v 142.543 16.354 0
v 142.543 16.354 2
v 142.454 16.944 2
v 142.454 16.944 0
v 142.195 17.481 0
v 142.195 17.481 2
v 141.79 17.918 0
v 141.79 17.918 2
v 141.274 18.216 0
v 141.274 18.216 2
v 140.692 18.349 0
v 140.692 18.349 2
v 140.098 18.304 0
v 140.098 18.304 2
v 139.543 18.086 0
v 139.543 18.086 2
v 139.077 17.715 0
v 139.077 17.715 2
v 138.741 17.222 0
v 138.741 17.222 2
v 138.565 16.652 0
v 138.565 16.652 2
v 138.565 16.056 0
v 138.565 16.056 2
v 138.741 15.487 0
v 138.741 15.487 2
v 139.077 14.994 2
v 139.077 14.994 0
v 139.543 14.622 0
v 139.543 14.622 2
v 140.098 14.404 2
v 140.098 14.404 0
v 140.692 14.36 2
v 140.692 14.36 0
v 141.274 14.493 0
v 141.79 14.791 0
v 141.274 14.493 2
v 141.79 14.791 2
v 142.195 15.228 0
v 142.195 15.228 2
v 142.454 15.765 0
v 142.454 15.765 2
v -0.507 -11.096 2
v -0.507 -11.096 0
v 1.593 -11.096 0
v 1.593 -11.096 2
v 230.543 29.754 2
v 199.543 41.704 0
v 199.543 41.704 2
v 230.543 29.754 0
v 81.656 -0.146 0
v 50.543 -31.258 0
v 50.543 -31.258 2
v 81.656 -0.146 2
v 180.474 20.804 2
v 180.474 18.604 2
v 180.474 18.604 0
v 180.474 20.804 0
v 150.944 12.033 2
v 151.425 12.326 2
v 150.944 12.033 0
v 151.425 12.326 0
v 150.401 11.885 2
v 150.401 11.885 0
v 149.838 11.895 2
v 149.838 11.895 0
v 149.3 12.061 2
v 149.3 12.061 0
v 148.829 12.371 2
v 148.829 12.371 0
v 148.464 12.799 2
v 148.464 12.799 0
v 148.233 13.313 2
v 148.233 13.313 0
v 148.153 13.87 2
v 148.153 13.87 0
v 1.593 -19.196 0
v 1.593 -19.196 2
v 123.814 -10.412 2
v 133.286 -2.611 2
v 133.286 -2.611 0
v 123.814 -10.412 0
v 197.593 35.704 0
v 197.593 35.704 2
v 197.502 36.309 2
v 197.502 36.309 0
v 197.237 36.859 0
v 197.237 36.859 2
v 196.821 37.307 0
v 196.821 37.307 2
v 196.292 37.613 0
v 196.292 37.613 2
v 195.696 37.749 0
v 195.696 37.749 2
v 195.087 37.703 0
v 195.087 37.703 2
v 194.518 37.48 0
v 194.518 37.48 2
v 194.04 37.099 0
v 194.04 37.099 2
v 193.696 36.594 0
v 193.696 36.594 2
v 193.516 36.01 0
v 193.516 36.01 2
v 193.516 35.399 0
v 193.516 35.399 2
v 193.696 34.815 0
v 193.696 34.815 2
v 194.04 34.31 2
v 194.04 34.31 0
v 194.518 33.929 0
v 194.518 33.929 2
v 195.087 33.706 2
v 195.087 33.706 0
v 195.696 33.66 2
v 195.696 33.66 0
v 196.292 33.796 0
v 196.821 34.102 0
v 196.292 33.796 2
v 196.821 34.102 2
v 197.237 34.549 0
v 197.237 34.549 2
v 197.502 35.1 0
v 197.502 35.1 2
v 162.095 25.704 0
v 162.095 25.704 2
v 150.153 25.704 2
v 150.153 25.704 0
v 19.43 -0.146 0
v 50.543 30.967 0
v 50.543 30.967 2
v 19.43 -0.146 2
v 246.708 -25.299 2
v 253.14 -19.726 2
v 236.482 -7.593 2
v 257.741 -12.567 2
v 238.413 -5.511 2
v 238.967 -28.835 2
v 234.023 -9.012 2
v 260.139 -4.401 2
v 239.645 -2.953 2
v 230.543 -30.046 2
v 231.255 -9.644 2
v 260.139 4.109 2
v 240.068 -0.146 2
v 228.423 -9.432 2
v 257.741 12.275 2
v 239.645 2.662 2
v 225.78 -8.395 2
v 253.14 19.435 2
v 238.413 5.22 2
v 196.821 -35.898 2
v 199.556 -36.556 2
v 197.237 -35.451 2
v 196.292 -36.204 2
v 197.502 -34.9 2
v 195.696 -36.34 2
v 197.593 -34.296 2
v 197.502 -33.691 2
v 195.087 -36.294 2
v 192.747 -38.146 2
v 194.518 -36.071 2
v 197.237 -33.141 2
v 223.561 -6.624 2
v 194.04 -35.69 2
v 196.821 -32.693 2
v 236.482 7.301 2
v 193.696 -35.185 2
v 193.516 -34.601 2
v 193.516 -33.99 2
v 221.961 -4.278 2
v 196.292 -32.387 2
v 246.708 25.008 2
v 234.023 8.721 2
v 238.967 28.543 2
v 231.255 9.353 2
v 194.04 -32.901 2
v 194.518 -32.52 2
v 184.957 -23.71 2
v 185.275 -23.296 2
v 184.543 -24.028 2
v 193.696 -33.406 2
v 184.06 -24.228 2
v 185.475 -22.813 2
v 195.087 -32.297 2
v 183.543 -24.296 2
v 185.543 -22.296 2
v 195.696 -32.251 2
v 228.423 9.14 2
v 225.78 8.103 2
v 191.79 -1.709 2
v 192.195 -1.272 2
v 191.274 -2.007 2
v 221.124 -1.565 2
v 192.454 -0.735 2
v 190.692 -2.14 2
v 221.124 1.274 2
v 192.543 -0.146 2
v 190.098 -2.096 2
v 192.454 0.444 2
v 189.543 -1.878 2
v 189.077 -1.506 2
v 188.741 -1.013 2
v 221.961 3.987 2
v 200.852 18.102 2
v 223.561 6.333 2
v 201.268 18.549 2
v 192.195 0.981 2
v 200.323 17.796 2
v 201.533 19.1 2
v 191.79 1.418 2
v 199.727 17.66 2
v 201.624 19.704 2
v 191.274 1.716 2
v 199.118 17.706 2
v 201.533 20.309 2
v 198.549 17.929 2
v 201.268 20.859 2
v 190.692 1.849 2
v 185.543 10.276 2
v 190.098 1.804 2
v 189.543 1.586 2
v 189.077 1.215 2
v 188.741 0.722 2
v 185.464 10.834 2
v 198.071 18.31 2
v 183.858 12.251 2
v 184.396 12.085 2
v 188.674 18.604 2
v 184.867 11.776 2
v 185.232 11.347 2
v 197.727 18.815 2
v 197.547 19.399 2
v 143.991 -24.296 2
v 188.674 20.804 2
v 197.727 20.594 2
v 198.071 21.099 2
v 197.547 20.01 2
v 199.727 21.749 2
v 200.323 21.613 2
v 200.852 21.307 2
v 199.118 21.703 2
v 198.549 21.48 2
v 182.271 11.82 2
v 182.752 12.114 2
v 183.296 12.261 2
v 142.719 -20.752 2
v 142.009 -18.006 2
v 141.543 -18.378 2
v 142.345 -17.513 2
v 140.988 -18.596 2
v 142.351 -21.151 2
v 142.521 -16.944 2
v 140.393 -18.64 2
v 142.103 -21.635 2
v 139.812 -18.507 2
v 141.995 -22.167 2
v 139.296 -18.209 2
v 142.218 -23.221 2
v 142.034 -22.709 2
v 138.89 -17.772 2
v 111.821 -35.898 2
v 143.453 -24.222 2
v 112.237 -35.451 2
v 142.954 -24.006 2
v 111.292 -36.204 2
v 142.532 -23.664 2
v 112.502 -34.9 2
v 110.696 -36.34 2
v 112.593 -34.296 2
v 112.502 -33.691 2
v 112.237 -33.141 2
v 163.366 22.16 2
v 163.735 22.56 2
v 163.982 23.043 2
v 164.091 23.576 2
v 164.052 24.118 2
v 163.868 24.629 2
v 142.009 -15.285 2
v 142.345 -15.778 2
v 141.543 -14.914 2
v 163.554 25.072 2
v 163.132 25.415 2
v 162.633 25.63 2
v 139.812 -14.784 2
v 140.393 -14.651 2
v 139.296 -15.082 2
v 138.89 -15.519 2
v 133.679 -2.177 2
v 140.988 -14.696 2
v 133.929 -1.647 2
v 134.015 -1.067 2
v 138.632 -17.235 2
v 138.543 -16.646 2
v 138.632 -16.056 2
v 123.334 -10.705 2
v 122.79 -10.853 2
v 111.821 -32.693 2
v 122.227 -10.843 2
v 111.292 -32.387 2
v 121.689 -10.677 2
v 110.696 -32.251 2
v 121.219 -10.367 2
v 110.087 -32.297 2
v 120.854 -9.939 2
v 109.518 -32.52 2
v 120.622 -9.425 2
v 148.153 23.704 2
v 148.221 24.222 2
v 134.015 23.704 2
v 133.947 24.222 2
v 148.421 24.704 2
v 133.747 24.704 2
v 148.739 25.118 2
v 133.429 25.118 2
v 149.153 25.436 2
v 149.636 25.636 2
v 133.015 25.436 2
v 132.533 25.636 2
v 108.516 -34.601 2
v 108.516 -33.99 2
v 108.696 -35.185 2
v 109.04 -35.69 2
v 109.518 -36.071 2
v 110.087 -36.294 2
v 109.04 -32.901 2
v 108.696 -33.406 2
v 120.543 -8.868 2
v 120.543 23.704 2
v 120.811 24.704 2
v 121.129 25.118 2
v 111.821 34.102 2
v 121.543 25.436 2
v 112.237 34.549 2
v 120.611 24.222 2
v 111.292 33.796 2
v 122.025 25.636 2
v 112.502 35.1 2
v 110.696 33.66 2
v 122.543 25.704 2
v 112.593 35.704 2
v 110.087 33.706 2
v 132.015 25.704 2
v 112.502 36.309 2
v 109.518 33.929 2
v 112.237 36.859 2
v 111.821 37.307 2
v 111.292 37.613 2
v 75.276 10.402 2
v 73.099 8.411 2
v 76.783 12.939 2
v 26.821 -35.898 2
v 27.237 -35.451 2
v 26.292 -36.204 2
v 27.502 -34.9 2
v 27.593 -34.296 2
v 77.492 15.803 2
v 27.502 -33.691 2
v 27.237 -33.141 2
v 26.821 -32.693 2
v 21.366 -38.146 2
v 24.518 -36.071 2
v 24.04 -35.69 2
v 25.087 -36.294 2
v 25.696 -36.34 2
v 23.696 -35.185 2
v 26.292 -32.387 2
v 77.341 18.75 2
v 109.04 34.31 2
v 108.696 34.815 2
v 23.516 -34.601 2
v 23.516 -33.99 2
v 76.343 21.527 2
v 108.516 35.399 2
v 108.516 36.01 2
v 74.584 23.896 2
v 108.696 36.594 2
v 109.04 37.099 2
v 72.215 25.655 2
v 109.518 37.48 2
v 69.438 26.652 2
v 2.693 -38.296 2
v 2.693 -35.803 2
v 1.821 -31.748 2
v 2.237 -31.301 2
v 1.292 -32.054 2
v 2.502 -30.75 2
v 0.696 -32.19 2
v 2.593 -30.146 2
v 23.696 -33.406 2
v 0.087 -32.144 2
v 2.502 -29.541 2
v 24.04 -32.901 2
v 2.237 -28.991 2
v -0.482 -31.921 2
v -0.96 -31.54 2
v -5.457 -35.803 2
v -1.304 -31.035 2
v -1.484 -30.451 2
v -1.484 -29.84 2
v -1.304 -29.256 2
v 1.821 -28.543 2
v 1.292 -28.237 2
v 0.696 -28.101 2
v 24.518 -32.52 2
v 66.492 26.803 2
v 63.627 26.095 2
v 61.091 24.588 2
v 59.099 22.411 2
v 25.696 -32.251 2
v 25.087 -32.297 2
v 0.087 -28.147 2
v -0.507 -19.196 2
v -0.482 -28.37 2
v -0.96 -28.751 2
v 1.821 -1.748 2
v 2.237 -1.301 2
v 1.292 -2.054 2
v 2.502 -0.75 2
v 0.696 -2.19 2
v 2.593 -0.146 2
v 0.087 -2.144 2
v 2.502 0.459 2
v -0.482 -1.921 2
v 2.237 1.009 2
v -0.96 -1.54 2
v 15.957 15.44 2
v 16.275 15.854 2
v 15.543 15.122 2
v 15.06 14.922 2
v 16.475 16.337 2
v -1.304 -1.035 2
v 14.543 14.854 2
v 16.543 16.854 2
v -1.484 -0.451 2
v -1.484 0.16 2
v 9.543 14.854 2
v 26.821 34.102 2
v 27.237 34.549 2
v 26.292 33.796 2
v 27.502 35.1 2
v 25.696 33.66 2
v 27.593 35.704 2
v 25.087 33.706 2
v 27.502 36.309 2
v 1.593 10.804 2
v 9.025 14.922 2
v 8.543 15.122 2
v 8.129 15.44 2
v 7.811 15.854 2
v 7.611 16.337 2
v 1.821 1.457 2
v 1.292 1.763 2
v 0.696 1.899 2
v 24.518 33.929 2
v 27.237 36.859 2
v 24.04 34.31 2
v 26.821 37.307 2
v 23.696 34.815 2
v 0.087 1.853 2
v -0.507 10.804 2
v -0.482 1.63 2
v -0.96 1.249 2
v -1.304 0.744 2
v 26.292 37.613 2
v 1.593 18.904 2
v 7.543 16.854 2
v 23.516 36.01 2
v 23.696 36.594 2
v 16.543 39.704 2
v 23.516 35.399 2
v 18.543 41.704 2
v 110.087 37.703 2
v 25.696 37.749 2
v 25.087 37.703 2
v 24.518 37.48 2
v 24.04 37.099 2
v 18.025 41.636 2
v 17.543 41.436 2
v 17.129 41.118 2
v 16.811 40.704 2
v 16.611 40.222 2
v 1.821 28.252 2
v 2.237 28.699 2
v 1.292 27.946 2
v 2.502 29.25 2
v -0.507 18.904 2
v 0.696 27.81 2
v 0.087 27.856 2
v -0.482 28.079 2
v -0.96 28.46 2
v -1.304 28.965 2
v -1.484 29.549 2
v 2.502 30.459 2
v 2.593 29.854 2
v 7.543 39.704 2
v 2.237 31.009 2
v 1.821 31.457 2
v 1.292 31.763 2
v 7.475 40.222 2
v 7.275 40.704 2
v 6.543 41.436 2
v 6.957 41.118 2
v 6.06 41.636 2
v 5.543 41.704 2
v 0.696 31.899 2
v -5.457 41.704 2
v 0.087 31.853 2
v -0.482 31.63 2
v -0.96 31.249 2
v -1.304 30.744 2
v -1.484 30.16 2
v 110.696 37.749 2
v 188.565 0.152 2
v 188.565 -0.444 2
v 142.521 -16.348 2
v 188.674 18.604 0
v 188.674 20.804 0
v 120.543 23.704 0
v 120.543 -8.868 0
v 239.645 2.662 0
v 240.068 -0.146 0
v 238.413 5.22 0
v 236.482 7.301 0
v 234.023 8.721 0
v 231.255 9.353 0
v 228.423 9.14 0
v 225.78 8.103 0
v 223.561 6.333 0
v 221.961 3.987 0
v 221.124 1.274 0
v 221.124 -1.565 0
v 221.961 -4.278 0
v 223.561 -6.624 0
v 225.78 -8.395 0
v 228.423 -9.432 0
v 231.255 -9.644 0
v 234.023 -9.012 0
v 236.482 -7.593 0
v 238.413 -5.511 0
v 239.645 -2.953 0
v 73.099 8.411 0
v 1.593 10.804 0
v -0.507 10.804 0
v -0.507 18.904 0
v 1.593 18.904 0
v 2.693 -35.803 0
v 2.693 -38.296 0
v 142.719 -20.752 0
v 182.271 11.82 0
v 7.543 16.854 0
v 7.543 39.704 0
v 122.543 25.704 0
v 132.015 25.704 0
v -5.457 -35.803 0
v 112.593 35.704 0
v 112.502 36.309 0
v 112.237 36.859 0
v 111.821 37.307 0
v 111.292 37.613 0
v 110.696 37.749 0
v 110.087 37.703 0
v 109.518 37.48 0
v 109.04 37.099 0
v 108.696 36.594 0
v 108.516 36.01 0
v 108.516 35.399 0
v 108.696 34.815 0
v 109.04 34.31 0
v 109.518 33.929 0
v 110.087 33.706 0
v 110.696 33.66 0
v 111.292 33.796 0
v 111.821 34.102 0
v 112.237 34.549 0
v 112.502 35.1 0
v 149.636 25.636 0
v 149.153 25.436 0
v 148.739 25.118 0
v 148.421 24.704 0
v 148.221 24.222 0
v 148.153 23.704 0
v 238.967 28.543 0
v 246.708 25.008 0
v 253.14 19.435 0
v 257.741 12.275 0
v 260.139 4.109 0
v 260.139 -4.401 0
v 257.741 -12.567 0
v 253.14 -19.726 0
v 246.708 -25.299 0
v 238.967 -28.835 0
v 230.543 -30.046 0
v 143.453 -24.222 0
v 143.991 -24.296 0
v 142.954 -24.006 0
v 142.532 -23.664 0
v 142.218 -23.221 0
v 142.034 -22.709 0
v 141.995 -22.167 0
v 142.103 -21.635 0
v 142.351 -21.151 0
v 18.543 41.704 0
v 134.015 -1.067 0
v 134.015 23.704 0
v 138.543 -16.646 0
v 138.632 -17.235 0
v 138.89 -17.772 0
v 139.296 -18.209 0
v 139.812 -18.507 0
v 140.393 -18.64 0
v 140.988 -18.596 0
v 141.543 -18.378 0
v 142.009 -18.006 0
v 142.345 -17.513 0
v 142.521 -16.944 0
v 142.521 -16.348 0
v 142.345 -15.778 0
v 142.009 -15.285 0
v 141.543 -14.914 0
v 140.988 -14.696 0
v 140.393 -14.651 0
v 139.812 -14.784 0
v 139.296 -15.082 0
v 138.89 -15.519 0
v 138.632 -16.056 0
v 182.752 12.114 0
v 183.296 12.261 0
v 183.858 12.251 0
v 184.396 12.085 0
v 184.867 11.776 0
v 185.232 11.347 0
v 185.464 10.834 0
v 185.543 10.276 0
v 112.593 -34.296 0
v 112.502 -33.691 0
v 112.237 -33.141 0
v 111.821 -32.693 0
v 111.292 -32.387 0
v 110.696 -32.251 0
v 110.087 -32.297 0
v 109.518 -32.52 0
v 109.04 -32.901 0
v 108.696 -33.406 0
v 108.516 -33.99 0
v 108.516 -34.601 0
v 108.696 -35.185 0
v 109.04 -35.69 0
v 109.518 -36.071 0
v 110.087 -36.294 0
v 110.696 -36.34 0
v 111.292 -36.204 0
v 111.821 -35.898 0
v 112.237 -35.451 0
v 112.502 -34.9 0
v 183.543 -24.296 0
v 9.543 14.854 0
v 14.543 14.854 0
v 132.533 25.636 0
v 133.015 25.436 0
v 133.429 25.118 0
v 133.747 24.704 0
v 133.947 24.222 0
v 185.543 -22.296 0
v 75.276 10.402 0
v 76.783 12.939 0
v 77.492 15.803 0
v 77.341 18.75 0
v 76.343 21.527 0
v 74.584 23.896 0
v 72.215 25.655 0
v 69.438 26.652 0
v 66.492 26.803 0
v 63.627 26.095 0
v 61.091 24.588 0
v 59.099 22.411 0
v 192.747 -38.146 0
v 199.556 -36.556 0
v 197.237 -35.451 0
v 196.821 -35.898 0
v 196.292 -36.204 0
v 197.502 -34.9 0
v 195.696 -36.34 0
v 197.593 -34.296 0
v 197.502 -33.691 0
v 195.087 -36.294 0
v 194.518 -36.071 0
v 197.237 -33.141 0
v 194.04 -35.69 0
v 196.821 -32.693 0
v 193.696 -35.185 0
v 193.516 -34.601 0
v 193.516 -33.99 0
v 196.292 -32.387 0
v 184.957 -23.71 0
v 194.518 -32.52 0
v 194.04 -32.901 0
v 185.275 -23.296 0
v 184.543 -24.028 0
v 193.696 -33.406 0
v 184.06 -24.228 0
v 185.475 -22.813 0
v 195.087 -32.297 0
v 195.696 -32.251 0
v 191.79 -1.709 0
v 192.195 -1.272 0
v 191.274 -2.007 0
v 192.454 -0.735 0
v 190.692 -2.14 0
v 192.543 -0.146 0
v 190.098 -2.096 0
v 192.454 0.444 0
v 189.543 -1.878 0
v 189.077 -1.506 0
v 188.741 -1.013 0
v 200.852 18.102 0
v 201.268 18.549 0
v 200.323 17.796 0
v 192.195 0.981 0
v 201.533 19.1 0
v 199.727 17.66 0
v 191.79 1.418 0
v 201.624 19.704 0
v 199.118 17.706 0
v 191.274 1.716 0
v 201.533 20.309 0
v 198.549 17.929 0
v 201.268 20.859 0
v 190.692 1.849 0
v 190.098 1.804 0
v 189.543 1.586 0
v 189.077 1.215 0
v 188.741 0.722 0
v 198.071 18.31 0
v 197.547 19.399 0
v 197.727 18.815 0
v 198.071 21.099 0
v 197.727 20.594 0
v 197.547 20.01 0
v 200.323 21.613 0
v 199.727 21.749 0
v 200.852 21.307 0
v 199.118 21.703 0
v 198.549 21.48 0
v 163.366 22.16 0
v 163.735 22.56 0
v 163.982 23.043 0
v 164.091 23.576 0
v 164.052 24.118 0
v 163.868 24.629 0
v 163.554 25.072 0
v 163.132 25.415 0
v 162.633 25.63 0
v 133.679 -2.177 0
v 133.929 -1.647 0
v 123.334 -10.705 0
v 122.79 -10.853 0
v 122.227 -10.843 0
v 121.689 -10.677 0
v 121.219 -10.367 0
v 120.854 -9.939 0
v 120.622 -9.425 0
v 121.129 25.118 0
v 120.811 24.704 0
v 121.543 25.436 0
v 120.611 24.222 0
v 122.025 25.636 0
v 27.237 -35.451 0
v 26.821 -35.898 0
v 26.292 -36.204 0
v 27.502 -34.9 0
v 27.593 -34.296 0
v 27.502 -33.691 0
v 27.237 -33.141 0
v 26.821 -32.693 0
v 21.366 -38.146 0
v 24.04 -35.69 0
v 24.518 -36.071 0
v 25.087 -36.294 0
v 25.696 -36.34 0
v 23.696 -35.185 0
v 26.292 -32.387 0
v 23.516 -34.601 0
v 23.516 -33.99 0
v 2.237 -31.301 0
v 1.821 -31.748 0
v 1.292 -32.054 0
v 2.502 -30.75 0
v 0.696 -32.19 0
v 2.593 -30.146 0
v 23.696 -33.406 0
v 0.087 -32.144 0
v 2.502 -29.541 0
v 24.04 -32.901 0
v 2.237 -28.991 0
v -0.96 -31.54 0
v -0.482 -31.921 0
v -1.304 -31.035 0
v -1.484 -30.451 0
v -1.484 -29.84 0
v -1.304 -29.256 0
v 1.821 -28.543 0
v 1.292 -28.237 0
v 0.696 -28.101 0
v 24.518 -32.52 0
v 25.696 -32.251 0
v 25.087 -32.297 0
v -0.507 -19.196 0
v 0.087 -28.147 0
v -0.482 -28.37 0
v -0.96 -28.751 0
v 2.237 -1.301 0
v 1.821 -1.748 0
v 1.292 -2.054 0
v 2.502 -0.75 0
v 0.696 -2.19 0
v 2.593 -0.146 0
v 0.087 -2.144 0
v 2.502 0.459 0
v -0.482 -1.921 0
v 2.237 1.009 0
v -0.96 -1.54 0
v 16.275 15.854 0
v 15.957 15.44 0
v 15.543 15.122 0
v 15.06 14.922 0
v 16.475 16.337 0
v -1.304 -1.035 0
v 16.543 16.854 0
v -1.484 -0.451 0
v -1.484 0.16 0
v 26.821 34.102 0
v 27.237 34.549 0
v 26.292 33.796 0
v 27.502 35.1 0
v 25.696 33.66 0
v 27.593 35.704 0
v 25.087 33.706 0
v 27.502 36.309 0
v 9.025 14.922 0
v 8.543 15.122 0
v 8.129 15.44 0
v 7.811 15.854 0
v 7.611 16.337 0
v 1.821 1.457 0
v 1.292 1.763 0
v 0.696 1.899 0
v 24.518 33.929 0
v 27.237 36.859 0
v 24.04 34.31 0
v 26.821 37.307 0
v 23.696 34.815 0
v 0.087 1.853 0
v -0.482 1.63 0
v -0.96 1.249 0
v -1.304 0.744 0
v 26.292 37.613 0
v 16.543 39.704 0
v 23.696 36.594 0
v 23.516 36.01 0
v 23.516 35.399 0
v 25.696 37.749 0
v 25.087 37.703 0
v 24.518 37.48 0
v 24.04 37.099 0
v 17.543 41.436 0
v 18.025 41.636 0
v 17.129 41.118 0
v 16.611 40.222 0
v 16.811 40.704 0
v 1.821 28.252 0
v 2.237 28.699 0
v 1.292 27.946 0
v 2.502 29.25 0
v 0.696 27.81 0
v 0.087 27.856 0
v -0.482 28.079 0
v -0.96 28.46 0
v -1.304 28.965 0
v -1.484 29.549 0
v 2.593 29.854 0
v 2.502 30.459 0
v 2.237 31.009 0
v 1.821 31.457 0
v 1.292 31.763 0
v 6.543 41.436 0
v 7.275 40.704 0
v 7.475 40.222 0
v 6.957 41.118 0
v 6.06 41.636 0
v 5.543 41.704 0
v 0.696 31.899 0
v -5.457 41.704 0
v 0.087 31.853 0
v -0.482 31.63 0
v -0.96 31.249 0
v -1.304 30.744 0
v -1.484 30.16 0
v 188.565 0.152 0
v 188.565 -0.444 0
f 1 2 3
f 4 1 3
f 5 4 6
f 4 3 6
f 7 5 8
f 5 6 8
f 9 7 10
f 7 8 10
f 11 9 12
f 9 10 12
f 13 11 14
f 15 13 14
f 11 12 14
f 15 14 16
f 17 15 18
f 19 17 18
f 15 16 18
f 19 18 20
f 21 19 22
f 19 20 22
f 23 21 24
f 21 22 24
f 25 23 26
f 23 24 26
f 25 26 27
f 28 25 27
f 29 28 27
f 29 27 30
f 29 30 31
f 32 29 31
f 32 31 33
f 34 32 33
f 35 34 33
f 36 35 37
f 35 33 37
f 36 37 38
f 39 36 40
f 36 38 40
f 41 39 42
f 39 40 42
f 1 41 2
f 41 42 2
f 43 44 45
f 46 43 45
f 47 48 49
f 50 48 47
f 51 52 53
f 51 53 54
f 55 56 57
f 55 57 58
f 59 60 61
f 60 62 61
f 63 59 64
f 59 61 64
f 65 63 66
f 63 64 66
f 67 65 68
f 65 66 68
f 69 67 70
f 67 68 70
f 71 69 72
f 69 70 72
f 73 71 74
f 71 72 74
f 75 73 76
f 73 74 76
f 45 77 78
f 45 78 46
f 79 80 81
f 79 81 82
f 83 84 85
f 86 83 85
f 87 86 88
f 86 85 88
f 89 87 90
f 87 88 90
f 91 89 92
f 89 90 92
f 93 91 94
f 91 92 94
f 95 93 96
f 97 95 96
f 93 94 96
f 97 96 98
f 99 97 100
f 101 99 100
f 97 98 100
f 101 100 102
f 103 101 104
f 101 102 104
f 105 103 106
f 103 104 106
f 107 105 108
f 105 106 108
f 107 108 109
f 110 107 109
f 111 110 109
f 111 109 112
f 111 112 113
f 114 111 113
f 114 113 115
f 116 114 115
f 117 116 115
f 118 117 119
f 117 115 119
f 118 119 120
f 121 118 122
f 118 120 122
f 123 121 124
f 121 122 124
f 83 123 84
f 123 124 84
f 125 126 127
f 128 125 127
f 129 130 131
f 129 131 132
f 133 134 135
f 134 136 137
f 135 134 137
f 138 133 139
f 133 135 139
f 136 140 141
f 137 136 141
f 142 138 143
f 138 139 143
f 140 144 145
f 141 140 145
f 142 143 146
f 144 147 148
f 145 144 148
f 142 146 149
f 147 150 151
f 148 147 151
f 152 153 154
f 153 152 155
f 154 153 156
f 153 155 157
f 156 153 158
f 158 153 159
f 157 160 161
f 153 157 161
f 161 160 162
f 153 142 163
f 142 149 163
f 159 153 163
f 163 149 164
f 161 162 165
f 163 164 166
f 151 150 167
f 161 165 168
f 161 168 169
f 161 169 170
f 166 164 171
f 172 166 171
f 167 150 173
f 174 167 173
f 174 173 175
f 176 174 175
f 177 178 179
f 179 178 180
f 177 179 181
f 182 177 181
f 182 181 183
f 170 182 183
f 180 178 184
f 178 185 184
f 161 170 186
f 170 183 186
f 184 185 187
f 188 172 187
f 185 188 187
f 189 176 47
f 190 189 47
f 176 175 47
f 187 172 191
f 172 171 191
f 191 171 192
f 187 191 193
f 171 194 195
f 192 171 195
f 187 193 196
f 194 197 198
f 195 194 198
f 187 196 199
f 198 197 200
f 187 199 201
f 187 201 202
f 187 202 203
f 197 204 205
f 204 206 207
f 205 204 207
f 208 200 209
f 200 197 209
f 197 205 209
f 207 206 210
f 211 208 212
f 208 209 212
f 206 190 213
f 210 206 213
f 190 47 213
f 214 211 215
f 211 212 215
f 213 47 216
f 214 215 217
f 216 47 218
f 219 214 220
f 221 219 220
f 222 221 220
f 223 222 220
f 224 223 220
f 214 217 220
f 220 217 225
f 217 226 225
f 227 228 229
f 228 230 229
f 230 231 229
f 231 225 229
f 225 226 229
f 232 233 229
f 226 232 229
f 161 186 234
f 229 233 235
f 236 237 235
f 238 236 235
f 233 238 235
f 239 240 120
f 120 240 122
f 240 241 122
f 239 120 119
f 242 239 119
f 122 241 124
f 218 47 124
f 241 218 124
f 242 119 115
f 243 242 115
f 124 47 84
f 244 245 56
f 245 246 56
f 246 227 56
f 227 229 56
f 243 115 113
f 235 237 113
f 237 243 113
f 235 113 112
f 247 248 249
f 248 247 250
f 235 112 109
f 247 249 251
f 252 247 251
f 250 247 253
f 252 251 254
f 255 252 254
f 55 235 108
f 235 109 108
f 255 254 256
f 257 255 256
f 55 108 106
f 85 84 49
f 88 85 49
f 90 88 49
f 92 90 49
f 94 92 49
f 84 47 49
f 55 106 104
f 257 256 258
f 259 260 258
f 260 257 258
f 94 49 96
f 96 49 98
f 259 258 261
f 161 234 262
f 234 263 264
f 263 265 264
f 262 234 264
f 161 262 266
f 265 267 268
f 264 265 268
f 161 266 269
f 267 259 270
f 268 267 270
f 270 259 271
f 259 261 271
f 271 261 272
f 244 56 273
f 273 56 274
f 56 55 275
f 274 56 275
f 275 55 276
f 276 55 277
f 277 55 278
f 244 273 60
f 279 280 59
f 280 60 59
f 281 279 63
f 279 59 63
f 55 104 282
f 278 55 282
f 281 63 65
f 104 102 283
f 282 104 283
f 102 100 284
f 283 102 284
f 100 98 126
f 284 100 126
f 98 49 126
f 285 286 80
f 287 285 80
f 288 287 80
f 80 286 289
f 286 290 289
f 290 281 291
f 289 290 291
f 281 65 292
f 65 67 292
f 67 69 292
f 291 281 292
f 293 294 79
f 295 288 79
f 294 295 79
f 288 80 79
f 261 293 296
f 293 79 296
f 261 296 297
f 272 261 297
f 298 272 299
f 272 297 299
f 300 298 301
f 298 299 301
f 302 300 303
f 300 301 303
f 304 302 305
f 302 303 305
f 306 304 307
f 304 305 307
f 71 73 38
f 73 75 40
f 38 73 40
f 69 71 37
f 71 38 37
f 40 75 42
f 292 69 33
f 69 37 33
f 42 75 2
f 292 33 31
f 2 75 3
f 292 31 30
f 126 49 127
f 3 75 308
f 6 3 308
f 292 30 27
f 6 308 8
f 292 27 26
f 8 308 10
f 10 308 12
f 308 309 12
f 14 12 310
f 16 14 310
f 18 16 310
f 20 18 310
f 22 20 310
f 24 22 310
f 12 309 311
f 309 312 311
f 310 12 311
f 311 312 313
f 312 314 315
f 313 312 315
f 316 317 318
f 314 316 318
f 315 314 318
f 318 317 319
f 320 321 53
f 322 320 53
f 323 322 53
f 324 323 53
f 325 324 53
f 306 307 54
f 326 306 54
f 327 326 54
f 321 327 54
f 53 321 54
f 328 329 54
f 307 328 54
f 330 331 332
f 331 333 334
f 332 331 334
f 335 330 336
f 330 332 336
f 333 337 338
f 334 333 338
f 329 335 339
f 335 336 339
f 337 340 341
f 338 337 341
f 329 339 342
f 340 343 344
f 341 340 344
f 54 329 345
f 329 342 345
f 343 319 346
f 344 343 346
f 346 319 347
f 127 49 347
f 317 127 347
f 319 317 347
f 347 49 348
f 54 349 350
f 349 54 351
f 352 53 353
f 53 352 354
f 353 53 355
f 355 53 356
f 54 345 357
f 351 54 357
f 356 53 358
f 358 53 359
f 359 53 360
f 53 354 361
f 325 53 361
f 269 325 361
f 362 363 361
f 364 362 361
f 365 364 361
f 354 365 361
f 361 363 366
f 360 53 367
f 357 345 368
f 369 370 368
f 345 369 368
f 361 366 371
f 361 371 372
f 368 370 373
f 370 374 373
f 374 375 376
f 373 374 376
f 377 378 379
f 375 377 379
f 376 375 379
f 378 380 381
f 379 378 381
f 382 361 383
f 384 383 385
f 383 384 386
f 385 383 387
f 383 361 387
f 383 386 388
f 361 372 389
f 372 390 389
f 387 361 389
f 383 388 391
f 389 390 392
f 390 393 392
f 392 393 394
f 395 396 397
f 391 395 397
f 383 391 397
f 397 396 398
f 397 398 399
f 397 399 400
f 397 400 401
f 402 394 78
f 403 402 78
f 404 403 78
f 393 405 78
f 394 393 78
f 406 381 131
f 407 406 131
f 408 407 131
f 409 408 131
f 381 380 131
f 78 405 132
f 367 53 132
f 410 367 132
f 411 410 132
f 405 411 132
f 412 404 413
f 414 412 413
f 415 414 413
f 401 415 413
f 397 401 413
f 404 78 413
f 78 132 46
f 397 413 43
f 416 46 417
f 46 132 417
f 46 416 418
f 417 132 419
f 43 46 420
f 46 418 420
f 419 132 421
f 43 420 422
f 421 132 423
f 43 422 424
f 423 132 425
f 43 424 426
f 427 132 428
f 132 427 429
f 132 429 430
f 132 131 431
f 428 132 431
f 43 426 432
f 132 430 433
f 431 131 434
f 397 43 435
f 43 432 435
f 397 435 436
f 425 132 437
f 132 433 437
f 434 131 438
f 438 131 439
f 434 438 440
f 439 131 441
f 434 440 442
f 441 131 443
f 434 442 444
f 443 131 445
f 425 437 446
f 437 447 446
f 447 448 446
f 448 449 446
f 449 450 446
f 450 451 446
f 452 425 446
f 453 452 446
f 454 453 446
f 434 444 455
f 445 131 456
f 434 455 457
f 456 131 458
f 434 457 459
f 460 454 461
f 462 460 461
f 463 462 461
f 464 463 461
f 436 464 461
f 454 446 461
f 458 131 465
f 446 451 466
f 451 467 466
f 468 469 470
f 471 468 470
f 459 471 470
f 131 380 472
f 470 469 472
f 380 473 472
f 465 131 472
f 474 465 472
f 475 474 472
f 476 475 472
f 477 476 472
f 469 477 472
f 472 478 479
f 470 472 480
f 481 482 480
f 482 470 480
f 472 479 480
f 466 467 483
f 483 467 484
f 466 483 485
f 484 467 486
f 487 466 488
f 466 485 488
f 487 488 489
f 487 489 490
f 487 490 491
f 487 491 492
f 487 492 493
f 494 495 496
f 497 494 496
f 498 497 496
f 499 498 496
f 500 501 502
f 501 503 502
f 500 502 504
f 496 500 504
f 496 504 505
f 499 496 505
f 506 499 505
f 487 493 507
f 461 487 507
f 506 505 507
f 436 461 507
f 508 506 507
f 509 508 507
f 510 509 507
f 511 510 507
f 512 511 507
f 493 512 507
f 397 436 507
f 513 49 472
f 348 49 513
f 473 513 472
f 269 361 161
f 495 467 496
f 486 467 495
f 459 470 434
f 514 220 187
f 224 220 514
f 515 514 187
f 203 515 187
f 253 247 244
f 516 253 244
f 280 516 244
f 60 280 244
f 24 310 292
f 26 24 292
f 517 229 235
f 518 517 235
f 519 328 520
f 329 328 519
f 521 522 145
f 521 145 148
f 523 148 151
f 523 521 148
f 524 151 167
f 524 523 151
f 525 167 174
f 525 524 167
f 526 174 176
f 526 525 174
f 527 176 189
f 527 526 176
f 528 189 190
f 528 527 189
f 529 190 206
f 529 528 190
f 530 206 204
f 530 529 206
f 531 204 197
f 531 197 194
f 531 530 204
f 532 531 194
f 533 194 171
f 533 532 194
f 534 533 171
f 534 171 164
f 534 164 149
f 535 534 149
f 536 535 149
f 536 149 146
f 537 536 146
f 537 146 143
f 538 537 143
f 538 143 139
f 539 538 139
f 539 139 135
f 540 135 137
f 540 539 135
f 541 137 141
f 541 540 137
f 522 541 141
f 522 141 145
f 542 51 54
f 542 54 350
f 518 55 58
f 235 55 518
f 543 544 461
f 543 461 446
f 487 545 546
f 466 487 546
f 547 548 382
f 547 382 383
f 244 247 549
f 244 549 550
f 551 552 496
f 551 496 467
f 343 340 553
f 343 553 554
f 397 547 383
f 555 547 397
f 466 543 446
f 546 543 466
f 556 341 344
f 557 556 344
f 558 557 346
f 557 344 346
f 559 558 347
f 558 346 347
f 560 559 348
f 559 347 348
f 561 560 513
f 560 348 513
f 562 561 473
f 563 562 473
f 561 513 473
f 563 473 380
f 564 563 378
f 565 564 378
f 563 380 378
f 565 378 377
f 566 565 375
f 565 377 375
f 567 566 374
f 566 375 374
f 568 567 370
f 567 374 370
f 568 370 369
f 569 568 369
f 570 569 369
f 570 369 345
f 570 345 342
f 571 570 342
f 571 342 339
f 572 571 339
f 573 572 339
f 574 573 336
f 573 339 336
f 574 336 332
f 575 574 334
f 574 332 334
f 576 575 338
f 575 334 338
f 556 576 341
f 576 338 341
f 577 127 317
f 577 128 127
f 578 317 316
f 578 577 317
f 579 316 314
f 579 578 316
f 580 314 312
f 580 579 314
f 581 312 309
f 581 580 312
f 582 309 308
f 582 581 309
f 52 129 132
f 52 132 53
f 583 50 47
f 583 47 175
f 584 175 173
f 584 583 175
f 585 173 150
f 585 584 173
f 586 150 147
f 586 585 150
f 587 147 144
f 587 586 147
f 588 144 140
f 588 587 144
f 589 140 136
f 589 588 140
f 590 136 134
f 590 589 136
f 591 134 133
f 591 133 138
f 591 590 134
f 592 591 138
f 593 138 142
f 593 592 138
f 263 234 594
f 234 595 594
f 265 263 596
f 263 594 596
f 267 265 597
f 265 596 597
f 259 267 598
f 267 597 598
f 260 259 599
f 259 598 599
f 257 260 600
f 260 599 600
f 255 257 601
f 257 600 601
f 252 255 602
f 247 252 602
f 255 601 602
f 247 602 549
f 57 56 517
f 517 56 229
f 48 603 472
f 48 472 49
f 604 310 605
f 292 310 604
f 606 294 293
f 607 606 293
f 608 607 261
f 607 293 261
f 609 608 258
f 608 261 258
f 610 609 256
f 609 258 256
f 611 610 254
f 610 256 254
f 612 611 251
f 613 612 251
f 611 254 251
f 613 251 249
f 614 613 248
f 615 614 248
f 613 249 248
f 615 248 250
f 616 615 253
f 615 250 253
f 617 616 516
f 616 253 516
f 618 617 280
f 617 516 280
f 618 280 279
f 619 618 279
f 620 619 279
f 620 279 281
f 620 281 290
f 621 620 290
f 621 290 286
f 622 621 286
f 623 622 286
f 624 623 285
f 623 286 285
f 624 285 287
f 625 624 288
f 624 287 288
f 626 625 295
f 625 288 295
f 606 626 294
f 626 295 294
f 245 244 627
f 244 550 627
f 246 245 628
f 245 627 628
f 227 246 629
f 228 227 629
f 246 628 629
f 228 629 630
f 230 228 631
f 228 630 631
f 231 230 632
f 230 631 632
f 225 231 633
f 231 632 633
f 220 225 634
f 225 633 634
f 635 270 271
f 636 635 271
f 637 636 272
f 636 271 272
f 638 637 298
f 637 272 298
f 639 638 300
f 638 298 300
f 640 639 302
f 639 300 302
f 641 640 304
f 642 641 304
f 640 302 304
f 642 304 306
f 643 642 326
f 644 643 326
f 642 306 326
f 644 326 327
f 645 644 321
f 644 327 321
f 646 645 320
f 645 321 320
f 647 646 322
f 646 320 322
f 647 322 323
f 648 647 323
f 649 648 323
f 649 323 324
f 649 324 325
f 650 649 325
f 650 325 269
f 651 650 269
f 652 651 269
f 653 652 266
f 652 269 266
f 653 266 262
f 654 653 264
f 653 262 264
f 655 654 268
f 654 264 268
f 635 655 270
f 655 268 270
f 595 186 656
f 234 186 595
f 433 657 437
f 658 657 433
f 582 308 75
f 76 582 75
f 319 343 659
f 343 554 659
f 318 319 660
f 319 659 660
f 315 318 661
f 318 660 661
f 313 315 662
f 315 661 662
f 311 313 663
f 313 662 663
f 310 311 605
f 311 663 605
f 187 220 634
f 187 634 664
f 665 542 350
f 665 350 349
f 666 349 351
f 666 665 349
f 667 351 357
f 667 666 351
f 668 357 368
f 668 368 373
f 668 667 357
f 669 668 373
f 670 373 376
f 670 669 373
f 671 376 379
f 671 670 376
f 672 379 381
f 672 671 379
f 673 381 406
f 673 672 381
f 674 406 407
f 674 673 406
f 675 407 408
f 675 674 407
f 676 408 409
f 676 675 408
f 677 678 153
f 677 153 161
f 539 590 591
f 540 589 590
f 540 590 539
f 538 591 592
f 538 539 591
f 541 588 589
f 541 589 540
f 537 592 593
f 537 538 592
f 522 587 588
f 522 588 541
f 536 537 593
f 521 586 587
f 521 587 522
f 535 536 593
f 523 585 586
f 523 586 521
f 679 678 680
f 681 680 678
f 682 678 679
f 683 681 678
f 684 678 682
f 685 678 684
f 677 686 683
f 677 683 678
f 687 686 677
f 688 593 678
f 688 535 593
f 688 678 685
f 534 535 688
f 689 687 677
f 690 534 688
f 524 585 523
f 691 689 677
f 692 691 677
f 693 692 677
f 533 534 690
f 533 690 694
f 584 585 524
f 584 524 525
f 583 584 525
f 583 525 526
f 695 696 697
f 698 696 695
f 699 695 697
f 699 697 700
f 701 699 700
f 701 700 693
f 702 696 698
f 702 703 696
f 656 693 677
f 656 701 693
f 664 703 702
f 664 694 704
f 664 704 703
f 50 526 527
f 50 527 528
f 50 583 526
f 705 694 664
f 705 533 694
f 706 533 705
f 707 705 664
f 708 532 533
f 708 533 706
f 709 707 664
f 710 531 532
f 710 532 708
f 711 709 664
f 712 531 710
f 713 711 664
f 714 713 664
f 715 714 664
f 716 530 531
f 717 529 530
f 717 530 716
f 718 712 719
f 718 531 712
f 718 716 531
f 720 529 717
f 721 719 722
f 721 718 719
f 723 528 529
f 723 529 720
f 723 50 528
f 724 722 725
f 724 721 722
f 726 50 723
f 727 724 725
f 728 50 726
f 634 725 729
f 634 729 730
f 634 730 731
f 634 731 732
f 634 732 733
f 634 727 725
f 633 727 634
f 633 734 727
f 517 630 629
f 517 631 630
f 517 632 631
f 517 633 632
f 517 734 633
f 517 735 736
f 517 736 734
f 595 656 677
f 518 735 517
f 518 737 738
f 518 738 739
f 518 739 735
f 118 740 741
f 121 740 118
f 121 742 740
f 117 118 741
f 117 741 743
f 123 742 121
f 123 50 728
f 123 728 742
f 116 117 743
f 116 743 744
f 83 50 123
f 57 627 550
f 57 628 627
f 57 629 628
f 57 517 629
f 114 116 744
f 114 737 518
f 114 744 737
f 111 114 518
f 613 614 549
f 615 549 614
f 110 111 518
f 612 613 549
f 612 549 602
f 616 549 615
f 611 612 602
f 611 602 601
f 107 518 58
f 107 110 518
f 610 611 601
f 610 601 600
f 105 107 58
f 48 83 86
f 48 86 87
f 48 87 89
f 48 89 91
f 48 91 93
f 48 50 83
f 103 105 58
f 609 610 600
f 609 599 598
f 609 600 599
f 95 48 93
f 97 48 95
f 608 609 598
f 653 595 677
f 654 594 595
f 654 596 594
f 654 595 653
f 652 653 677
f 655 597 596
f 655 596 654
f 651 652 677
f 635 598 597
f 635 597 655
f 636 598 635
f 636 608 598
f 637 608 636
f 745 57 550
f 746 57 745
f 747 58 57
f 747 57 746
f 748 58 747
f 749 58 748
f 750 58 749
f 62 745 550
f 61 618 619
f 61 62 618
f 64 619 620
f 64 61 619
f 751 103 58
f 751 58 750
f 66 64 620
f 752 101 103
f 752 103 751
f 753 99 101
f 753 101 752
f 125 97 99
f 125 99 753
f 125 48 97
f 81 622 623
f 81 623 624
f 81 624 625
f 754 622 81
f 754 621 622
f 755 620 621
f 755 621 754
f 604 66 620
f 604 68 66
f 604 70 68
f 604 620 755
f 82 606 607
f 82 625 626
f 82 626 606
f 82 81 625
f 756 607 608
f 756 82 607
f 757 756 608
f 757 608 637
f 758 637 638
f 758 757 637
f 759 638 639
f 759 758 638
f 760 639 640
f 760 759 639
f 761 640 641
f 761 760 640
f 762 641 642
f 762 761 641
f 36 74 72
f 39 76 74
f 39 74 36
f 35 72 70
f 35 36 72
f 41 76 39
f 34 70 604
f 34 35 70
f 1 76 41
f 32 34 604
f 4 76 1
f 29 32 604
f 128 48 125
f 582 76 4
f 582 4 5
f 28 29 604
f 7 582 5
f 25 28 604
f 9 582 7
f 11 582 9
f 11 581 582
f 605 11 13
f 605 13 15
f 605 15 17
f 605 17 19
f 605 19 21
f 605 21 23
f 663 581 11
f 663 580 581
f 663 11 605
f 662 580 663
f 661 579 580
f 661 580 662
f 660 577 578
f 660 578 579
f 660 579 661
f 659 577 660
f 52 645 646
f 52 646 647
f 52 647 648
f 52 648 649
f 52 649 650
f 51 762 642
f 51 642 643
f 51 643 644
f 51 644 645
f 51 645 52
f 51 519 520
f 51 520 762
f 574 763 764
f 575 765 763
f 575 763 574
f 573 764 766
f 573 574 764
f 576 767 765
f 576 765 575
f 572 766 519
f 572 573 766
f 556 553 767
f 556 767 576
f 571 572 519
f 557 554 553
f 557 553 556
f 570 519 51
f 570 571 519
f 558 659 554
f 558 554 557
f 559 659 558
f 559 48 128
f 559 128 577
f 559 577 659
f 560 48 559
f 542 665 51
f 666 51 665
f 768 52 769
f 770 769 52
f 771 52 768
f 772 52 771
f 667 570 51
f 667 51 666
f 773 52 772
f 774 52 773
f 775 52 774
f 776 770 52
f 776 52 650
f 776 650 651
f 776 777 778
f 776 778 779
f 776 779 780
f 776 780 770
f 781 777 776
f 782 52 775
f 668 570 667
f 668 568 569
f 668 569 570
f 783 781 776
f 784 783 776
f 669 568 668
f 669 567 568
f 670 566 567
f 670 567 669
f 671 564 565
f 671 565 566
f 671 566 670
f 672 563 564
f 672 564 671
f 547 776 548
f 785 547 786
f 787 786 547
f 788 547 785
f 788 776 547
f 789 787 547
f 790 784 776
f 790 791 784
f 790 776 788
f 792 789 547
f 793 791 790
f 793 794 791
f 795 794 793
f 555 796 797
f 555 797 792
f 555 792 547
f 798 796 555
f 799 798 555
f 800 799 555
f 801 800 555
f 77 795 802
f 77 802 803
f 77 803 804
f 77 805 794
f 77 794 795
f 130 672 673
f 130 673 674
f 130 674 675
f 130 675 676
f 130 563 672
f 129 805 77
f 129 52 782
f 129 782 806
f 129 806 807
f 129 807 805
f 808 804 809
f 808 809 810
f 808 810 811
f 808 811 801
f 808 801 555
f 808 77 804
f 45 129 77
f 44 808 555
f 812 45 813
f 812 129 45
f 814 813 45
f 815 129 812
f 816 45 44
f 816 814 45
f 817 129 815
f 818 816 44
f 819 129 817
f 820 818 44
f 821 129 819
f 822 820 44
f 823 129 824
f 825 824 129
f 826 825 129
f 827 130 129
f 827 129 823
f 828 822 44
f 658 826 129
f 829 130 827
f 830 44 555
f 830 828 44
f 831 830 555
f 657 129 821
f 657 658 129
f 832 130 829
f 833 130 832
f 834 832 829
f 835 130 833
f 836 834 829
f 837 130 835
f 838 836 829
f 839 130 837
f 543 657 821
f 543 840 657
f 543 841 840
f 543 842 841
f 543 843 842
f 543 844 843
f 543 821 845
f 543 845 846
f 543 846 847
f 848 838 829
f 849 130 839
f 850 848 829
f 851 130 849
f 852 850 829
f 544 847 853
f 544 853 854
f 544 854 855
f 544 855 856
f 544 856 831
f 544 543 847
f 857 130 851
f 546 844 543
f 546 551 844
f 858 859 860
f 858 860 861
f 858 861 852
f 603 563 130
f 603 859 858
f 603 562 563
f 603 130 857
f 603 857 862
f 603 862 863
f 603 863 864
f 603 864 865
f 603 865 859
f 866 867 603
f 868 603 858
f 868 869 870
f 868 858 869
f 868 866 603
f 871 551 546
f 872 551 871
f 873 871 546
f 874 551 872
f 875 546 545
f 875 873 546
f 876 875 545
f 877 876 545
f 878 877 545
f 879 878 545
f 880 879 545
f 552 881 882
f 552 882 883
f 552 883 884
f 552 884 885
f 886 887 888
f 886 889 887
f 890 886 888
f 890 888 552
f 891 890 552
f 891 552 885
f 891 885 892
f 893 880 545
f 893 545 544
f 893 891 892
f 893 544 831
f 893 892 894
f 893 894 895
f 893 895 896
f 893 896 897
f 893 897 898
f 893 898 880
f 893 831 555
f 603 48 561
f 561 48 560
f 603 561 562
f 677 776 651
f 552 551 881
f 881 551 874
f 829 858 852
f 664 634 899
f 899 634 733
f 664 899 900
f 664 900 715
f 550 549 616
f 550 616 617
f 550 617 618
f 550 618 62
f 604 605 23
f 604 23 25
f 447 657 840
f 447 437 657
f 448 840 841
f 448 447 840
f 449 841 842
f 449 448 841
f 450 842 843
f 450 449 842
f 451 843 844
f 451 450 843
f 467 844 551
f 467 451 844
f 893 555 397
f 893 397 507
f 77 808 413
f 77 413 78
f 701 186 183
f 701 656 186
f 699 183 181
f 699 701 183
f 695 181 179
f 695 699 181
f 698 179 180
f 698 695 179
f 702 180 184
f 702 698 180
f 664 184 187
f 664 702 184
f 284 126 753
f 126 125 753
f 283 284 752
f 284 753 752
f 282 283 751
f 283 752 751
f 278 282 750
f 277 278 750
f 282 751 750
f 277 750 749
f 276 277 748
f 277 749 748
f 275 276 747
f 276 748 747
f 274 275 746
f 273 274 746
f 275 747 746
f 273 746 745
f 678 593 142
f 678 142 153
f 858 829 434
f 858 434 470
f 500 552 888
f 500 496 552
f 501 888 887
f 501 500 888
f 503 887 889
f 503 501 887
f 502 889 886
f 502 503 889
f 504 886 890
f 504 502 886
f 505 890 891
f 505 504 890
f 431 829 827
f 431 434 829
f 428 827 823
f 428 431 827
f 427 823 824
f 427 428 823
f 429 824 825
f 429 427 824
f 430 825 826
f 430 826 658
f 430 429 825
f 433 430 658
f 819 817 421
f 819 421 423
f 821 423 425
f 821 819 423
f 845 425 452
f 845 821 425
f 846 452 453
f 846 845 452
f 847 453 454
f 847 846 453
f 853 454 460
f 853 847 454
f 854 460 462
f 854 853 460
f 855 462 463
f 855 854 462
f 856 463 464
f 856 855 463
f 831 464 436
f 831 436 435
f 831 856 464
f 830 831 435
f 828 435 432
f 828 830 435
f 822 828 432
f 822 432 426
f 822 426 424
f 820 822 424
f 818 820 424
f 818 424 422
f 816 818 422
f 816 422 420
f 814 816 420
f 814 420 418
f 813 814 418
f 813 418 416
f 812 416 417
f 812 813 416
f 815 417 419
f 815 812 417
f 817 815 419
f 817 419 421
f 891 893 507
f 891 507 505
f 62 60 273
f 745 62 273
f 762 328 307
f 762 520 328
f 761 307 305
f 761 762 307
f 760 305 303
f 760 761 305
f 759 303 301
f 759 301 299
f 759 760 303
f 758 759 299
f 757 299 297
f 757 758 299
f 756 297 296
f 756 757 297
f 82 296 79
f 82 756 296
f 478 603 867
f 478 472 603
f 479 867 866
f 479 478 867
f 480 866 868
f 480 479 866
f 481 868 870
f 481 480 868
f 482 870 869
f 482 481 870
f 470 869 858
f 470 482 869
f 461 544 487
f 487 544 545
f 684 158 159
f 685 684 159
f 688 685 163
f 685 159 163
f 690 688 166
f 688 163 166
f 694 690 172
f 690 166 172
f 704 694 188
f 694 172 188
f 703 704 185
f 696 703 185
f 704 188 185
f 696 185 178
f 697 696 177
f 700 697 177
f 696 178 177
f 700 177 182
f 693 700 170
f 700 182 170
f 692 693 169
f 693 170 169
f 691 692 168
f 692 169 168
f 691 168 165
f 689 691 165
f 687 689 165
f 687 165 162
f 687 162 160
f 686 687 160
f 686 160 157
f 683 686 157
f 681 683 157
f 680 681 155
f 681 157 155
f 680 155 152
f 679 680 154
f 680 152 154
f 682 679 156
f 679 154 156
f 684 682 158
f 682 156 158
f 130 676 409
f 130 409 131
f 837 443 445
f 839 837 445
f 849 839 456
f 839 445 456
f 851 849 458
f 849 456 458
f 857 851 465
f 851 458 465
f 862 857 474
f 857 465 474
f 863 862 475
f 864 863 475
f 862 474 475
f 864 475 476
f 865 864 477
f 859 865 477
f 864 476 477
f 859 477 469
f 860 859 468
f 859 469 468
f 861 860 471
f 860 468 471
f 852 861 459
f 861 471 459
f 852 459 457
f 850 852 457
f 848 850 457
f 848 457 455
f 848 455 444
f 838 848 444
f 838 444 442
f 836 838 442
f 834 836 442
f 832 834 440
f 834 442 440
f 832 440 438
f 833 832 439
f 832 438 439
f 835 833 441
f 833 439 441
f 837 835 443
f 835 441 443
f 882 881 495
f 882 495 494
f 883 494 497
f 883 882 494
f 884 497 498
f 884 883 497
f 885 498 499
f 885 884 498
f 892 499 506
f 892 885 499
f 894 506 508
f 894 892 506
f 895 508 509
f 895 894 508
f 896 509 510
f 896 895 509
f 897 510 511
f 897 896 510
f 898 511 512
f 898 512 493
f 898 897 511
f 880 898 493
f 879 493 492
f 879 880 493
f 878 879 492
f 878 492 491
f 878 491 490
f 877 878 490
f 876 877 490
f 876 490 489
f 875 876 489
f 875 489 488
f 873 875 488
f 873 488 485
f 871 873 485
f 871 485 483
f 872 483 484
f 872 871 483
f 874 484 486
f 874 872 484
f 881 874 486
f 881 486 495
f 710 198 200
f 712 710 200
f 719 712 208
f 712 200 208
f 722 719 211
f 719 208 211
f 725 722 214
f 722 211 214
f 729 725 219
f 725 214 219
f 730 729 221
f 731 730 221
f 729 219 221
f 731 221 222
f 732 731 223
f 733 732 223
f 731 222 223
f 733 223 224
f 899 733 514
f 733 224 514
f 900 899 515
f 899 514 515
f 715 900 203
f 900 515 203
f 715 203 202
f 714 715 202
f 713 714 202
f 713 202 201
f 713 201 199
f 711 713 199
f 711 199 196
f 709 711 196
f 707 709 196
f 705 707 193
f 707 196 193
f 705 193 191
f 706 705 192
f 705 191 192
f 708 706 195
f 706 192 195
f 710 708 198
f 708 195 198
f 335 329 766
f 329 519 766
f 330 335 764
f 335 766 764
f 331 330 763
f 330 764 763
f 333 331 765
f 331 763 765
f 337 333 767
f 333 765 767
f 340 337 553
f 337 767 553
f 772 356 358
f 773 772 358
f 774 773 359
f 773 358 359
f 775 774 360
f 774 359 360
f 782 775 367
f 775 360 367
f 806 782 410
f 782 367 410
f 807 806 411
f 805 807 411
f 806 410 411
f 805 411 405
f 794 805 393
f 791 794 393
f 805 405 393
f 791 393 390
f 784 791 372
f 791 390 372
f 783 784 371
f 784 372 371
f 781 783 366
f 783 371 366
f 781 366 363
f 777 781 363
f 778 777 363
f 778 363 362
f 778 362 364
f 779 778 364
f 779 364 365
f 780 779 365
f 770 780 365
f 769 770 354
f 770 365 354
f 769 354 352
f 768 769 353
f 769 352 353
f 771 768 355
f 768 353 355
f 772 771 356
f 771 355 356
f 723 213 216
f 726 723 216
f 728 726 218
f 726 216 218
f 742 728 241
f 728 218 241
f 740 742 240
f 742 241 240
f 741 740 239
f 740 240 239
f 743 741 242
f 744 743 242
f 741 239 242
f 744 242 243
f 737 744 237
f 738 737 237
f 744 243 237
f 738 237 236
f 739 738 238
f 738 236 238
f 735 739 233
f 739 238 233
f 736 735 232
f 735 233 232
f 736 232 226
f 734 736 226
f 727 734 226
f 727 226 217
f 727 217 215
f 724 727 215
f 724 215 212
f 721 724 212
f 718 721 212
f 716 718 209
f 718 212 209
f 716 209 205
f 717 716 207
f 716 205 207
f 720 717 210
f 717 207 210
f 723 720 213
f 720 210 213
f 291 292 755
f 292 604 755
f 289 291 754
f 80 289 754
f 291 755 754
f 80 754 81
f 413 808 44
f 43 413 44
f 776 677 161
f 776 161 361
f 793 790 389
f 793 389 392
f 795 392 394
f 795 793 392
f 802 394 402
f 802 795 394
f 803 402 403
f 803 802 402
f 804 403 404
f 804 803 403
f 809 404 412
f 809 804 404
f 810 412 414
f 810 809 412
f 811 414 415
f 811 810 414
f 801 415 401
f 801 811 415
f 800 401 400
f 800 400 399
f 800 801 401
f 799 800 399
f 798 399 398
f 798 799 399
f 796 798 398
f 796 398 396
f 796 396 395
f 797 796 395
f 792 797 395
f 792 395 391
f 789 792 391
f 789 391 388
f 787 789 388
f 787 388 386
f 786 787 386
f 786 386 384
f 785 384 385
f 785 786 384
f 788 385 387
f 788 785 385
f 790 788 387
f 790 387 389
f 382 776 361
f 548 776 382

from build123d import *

# Parameters (mm, degrees)
SKETCH_1_R          = 2.05
SKETCH_1_R_2        = 9.525
SKETCH_1_W          = 2.1
SKETCH_1_H          = 8.1
EXTRUDE_1_DEPTH     = 2
FILLET_1_R          = 2
SKETCH_3_R          = 2.05
SKETCH_3_R_2        = 2
SKETCH_3_W          = 8.2
SKETCH_3_H          = 2.2
CUT_EXTRUDE_1_DEPTH = 2
FILLET_2_R          = 2


with BuildPart() as part:
    # 草图1 → 凸台-拉伸1 (new body)
    with BuildSketch(Plane.XY):
        with BuildLine():
            Line((230.542857143, -30.045714286), (199.556073527, -36.55591431))
            Line((199.556073527, -36.55591431), (192.746868021, -38.145714286))
            Line((192.746868021, -38.145714286), (21.365844759, -38.145714286))
            Line((21.365844759, -38.145714286), (2.692857143, -38.295714286))
            Line((2.692857143, -38.295714286), (2.692857143, -35.802553436))
            Line((2.692857143, -35.802553436), (-5.457142857, -35.802553436))
            Line((-5.457142857, -35.802553436), (-5.457142857, 41.704285714))
            Line((-5.457142857, 41.704285714), (7.542857143, 41.704285714))
            Line((7.542857143, 41.704285714), (7.542857143, 14.854285714))
            Line((7.542857143, 14.854285714), (16.542857143, 14.854285714))
            Line((16.542857143, 14.854285714), (16.542857143, 41.704285714))
            Line((16.542857143, 41.704285714), (199.542857143, 41.704285714))
            Line((199.542857143, 41.704285714), (230.542857143, 29.754285714))
            ThreePointArc((230.542857143, 29.754285714), (260.442857143, -0.145714286), (230.542857143, -30.045714286))
        make_face()
        with Locations((0.542857143, 29.854285714)):
            Circle(SKETCH_1_R, mode=Mode.SUBTRACT)
        with Locations((0.542857143, -0.145714286)):
            Circle(SKETCH_1_R, mode=Mode.SUBTRACT)
        with Locations((0.542857143, -30.145714286)):
            Circle(SKETCH_1_R, mode=Mode.SUBTRACT)
        with Locations((230.542857143, -0.145714286)):
            Circle(SKETCH_1_R_2, mode=Mode.SUBTRACT)
        with Locations((0.542857143, 14.854285714)):
            Rectangle(SKETCH_1_W, SKETCH_1_H, mode=Mode.SUBTRACT)
        with BuildLine():
            Line((59.099206329, 22.4106349), (50.542857143, 30.966984086))
            Line((50.542857143, 30.966984086), (19.430158771, -0.145714286))
            Line((19.430158771, -0.145714286), (50.542857143, -31.258412658))
            Line((50.542857143, -31.258412658), (81.655555515, -0.145714286))
            Line((81.655555515, -0.145714286), (73.099206329, 8.4106349))
            ThreePointArc((73.099206329, 8.4106349), (74.584487703, 23.895916275), (59.099206329, 22.4106349))
        make_face(mode=Mode.SUBTRACT)
        with Locations((0.542857143, -15.145714286)):
            Rectangle(SKETCH_1_W, SKETCH_1_H, mode=Mode.SUBTRACT)
    extrude(amount=EXTRUDE_1_DEPTH)

    # 圆角1
    fillet_1_edges = [part.edges().sort_by_distance(p)[0] for p in [
        (7.542857143, 41.704285714, 1),
        (7.542857143, 14.854285714, 1),
        (16.542857143, 14.854285714, 1),
        (16.542857143, 41.704285714, 1),
    ]]
    fillet(fillet_1_edges, radius=FILLET_1_R)

    # 草图3 → 切除-拉伸1 (cut)
    with BuildSketch(Plane.XY.offset(2)):
        with Locations((25.542857143, 35.704285714)):
            Circle(SKETCH_3_R)
        with Locations((110.542857143, 35.704285714)):
            Circle(SKETCH_3_R)
        with Locations((195.542857143, 35.704285714)):
            Circle(SKETCH_3_R)
        with Locations((110.542857143, -34.295714286)):
            Circle(SKETCH_3_R)
        with Locations((195.542857143, -34.295714286)):
            Circle(SKETCH_3_R)
        with Locations((25.542857143, -34.295714286)):
            Circle(SKETCH_3_R)
        with Locations((190.542857143, -0.145714286)):
            Circle(SKETCH_3_R_2)
        with Locations((140.542857143, 16.354285714)):
            Circle(SKETCH_3_R_2)
        with Locations(Location((140.542857143, -16.645714286, 0), (0, 0, 180))):
            Circle(SKETCH_3_R_2)
        with Locations((199.574018739, 19.704285714)):
            Circle(SKETCH_3_R)
        Polygon((148.153334198, 25.704285714), (148.153334198, 9.632158315), (167.669488896, 25.704285714), align=None)
        Polygon((185.542857143, -24.295714286), (138.41622539, -24.295714286), (185.542857143, 14.51445304), align=None)
        Polygon((120.542857143, -13.105881612), (120.542857143, 25.704285714), (134.014872528, 25.704285714), (134.014872528, -2.011280706), align=None)
        with Locations((184.574018739, 19.704285714)):
            Rectangle(SKETCH_3_W, SKETCH_3_H)
    extrude(amount=-CUT_EXTRUDE_1_DEPTH, mode=Mode.SUBTRACT)

    # 圆角2
    fillet_2_edges = [part.edges().sort_by_distance(p)[0] for p in [
        (167.669488896, 25.704285714, 1),
        (148.153334198, 9.632158315, 1),
        (148.153334198, 25.704285714, 1),
        (120.542857143, 25.704285714, 1),
        (134.014872528, 25.704285714, 1),
        (134.014872528, -2.011280706, 1),
        (120.542857143, -13.105881612, 1),
        (185.542857143, 14.51445304, 1),
        (185.542857143, -24.295714286, 1),
        (138.41622539, -24.295714286, 1),
    ]]
    fillet(fillet_2_edges, radius=FILLET_2_R)


solid = part.part
